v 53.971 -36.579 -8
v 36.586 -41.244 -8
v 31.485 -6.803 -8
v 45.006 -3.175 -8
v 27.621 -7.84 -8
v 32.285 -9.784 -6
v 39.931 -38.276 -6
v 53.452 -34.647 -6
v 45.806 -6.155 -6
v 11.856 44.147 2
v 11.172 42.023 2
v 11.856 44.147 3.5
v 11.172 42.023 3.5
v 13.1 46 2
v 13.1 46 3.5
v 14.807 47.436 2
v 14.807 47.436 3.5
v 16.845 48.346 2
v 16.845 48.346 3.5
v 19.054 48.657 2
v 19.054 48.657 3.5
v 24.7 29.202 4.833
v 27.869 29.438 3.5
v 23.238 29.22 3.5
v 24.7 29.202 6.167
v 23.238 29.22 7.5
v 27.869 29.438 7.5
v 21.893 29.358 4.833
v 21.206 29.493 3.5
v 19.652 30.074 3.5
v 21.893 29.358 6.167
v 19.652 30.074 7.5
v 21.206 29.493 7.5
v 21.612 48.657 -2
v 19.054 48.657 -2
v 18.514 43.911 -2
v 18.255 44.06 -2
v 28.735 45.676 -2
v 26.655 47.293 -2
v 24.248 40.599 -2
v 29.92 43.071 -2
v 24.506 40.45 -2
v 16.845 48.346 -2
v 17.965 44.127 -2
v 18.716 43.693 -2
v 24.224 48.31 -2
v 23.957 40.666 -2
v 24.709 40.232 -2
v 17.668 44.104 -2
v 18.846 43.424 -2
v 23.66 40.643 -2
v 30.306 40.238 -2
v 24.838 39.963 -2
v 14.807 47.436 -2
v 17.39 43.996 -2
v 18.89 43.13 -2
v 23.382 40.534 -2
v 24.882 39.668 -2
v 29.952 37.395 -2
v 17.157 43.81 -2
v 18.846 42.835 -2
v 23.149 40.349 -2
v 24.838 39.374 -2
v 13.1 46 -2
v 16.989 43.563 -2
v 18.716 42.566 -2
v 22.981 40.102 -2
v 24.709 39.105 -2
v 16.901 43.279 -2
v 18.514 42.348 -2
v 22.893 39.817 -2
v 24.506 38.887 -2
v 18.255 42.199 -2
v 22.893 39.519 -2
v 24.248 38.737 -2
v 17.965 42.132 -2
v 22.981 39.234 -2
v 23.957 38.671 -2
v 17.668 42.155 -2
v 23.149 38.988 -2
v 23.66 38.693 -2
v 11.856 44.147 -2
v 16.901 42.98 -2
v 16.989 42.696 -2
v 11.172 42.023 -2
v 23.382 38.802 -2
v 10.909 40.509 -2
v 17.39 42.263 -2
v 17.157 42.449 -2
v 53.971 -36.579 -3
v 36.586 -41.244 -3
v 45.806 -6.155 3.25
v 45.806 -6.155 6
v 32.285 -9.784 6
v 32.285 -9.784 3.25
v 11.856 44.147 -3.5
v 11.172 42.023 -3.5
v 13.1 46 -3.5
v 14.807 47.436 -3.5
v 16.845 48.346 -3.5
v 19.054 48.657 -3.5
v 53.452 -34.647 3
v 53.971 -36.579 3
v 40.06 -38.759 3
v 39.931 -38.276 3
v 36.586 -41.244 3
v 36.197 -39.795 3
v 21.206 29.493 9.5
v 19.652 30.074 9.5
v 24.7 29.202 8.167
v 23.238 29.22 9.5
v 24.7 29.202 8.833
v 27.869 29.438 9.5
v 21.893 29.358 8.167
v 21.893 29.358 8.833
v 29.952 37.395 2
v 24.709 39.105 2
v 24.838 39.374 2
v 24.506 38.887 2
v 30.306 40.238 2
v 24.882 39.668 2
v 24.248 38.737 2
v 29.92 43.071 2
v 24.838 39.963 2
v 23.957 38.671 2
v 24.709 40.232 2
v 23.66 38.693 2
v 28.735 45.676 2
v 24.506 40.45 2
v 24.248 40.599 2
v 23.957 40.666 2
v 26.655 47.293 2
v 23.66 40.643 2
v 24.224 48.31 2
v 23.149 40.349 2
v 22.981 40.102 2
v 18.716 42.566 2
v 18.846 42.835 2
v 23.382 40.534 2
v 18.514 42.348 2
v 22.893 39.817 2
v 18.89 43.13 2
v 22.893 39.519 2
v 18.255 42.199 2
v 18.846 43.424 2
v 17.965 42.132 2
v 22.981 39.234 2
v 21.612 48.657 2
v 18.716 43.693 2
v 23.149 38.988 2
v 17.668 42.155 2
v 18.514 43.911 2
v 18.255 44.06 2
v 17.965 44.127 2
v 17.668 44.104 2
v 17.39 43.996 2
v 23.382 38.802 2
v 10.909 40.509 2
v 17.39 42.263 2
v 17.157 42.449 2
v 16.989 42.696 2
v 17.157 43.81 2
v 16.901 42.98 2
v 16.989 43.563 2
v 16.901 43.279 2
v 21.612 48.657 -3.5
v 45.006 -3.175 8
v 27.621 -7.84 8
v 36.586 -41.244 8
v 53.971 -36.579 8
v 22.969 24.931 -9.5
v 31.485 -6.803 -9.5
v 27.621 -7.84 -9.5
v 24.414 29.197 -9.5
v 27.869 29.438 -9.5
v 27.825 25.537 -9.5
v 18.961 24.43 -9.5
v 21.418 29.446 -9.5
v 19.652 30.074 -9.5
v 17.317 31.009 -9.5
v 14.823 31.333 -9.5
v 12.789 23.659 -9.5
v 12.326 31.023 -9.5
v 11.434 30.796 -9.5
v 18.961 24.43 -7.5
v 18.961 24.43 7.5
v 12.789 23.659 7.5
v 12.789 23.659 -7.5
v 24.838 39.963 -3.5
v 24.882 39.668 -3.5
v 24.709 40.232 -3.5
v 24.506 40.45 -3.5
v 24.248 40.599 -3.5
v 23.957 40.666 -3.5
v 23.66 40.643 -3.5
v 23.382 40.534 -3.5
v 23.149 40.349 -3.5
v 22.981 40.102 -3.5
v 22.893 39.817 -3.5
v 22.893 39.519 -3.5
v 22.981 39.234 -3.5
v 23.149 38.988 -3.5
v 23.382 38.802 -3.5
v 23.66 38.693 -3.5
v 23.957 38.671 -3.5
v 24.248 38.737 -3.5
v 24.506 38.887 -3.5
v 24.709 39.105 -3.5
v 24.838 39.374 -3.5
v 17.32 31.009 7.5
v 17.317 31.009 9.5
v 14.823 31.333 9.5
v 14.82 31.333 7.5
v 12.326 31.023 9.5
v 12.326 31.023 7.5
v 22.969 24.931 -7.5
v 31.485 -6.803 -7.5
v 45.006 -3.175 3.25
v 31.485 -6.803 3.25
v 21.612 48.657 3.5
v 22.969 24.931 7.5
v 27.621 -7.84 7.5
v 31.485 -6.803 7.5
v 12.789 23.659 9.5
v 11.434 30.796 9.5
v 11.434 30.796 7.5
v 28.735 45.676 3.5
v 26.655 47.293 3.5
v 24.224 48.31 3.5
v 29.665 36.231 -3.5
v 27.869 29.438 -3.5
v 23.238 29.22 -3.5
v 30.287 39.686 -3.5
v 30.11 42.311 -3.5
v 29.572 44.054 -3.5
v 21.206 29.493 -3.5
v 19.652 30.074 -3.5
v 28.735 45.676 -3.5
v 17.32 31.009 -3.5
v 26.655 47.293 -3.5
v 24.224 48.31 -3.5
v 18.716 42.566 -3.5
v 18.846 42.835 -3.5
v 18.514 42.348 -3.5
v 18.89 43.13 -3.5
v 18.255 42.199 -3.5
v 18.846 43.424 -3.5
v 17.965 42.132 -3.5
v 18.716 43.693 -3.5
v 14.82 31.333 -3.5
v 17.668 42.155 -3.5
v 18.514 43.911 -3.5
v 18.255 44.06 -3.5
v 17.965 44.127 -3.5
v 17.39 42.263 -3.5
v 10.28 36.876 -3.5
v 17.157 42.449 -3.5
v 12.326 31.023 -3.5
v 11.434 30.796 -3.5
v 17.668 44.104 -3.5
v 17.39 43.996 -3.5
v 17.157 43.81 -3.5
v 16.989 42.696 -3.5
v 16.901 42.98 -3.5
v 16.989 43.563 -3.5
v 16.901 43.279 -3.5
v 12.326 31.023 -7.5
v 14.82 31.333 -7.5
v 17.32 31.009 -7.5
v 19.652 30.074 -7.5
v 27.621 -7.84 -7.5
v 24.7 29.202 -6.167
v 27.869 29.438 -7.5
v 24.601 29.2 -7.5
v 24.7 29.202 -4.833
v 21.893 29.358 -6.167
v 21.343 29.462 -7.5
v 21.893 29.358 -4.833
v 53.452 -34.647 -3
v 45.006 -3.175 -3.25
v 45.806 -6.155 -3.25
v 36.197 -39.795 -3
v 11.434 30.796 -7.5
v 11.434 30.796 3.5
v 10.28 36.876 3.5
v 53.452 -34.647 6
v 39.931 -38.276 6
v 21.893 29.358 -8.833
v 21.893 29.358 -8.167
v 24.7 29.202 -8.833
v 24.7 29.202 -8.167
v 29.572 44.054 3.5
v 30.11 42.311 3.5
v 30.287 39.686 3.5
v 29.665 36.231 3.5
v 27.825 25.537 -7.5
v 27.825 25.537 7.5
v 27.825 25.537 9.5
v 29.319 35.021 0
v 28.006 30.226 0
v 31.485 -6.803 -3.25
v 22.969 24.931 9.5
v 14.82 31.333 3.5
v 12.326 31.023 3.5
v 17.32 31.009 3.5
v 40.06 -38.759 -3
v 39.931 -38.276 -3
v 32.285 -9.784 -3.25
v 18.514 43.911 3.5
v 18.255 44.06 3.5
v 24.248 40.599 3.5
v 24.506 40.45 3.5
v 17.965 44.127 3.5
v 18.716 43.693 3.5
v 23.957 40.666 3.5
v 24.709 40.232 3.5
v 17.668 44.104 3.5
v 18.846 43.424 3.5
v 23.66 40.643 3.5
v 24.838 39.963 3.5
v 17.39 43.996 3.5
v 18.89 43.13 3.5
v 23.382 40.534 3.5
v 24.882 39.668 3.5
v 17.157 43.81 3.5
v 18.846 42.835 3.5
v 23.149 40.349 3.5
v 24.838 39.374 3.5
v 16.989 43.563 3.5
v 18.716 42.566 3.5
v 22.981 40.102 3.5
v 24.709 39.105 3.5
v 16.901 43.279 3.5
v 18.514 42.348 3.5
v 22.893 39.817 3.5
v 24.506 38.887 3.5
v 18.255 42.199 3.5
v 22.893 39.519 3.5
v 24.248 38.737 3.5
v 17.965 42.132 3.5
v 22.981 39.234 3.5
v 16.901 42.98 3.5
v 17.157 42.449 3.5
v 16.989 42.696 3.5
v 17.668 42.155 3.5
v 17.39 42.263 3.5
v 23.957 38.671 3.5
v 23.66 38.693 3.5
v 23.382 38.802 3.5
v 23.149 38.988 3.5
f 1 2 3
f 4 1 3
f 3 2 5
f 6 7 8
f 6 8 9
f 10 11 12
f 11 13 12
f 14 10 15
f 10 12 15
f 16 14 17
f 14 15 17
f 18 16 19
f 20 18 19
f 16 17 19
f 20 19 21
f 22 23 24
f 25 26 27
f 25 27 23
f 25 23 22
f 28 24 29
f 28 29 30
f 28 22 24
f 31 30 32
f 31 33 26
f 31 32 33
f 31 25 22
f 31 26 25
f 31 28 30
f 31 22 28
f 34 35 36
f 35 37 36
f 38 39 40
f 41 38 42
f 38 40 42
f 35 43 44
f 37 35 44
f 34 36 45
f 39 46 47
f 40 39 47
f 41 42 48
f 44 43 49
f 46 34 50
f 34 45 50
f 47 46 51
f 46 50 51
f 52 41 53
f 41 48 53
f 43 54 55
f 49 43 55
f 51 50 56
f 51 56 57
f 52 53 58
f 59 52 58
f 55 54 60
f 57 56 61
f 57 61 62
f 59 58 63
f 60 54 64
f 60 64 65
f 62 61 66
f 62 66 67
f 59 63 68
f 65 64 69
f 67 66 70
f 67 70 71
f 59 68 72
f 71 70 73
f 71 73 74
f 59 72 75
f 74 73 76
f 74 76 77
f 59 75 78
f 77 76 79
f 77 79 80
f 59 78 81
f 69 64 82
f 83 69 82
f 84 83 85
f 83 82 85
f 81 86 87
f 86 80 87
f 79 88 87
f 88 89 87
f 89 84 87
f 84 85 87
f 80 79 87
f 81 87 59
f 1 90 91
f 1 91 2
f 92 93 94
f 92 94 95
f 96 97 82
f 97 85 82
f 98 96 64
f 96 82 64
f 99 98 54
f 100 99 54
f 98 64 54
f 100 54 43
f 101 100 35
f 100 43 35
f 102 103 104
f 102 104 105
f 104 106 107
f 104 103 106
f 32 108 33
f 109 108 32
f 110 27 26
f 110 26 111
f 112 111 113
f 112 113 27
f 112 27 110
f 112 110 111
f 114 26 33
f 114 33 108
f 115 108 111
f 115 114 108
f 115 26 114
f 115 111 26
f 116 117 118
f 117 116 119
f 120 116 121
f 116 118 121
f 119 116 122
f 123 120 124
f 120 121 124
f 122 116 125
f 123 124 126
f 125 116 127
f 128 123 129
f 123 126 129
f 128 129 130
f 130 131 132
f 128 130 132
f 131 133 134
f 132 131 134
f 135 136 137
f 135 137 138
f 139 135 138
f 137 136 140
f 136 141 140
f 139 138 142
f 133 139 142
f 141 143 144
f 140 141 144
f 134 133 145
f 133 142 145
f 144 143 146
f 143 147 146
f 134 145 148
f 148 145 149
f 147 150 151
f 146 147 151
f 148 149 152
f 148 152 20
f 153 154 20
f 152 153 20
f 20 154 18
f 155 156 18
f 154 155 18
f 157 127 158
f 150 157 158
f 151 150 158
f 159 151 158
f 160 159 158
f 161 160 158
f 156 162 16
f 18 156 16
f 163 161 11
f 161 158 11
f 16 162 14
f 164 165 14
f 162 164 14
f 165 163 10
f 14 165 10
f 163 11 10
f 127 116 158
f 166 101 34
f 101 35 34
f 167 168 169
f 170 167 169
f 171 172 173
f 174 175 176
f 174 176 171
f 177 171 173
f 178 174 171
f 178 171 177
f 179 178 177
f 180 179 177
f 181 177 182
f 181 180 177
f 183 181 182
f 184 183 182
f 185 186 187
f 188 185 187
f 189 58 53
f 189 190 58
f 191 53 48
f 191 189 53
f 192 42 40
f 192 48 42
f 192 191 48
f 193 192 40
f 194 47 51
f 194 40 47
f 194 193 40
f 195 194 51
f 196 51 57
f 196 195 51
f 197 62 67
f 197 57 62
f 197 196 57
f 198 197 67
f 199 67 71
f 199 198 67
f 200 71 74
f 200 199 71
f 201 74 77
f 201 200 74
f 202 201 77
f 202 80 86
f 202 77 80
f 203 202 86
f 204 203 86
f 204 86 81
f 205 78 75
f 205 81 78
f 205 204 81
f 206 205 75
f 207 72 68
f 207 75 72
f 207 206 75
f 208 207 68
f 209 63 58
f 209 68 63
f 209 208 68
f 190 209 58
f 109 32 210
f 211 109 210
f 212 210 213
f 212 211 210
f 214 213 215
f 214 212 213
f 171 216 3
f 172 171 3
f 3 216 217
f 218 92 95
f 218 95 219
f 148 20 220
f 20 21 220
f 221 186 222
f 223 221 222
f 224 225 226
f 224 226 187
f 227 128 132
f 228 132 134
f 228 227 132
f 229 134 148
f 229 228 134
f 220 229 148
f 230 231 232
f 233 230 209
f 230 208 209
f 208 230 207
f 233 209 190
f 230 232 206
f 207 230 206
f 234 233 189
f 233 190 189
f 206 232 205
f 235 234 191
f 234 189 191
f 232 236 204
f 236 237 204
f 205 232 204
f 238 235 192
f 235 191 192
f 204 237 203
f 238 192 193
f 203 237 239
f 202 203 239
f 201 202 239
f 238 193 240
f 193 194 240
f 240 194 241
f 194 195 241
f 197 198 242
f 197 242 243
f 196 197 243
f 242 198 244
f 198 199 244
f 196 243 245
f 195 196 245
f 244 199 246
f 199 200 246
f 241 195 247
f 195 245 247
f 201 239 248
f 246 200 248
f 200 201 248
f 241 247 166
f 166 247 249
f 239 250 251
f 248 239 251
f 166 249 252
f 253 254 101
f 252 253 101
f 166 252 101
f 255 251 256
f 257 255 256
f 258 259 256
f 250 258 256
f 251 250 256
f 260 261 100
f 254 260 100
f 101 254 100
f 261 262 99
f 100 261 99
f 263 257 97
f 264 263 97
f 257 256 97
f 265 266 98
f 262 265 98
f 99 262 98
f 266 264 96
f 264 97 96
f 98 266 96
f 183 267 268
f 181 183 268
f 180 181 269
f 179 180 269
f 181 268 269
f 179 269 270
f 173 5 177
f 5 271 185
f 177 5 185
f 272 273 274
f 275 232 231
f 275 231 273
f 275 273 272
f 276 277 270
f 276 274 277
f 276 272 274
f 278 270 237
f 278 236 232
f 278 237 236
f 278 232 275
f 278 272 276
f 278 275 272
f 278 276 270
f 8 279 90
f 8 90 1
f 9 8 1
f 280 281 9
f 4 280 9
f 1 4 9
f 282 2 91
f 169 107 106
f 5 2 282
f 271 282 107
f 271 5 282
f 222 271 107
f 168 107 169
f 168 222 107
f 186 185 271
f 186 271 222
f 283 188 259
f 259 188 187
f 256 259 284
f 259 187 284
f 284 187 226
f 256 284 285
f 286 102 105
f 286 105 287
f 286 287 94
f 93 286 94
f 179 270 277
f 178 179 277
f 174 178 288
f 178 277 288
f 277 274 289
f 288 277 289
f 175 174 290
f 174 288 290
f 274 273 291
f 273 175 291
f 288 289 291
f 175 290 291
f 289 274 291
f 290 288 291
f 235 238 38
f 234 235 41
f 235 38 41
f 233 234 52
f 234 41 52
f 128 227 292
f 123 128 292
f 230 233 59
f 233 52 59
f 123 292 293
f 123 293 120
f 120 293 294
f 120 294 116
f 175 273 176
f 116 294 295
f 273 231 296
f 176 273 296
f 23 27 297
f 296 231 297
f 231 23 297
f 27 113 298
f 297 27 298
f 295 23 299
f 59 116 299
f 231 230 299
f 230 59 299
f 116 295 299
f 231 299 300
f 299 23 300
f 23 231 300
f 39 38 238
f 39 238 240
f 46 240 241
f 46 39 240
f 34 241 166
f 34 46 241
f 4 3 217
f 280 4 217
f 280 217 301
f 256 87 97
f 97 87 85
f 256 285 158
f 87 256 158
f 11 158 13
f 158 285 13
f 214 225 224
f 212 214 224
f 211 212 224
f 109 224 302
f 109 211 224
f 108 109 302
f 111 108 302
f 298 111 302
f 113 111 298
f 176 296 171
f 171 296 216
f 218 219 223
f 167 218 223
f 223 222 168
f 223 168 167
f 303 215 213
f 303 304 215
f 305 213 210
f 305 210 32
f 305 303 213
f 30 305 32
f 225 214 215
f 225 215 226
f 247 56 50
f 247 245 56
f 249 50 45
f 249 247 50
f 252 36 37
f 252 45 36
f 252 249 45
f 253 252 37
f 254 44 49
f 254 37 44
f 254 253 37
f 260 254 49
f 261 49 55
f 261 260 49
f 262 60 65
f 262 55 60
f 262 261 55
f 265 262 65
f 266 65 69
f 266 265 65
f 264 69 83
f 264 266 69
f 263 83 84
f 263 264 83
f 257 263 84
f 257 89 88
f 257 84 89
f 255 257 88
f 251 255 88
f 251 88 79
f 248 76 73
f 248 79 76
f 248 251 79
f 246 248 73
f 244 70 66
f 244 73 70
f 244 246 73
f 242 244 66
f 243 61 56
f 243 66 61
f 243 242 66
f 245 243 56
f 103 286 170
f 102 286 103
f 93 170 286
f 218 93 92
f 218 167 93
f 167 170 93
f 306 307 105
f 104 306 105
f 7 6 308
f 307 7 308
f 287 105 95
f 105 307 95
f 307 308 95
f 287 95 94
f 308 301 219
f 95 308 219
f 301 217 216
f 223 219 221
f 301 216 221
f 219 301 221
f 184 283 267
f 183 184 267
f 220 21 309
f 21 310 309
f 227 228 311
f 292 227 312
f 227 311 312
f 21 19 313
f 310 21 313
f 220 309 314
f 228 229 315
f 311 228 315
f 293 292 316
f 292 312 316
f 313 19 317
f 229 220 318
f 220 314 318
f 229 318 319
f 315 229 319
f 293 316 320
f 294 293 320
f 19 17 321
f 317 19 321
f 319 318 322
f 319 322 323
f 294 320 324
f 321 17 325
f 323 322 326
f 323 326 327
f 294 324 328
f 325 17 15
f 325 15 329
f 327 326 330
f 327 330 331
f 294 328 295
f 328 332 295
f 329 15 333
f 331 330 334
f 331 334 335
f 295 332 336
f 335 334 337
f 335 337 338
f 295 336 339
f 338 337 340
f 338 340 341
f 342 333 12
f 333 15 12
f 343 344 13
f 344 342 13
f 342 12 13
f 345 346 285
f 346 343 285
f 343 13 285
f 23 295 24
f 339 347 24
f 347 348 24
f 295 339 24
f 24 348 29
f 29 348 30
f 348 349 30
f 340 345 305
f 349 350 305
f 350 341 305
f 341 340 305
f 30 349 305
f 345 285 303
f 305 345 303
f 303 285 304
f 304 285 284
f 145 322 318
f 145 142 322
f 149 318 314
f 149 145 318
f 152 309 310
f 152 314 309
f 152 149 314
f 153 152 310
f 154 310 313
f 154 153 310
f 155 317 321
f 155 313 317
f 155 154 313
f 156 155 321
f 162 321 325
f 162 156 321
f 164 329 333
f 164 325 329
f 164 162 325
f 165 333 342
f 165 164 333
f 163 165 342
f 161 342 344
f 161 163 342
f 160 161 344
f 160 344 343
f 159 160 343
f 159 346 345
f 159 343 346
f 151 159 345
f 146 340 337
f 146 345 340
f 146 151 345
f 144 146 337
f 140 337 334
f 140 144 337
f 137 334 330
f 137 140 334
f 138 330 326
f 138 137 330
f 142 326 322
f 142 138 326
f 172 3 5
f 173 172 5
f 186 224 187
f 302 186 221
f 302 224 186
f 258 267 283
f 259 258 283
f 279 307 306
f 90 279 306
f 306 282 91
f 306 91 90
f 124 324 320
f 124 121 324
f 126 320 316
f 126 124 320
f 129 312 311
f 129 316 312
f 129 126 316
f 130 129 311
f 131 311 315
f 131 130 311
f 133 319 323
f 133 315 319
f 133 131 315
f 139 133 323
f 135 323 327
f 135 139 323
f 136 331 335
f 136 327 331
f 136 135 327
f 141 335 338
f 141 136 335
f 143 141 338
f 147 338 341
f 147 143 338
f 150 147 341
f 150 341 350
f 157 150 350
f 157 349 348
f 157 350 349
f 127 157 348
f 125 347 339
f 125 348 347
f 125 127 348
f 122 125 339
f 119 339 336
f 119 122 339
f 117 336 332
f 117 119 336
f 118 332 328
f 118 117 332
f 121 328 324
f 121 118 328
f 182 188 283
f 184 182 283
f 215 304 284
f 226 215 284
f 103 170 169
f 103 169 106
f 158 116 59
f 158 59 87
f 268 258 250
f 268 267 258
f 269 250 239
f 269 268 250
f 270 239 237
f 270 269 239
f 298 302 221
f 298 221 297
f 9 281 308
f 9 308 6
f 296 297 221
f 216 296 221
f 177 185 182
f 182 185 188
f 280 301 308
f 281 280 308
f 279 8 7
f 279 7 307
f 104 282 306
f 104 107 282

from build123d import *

# Parameters (mm, degrees)
SKETCH10_R                = 1
BOSS_EXTRUDE5_DEPTH       = 7.5
CUT_EXTRUDE1_DEPTH        = 4
FILLET1_R                 = 10
CUT_EXTRUDE6_START        = -11
CUT_EXTRUDE6_DEPTH        = 10
CUT_EXTRUDE7_DEPTH        = 2
BOSS_EXTRUDE11_DEPTH      = 9
BOSS_EXTRUDE13_DEPTH      = 64
BOSS_EXTRUDE13_DEPTH_BACK = 3
SKETCH30_W                = 2
SKETCH30_H                = 15
BOSS_EXTRUDE14_DEPTH      = 14
BOSS_EXTRUDE14_DEPTH_BACK = 4
SKETCH31_W                = 1.5
SKETCH31_H                = 29.5
SKETCH31_W_2              = 0.5
SKETCH31_H_2              = 3.0862264
CUT_EXTRUDE9_DEPTH        = 9
FILLET2_R                 = 8
FILLET3_R                 = 10
BOSS_EXTRUDE15_DEPTH      = 2
BOSS_EXTRUDE16_START      = 2
BOSS_EXTRUDE16_DEPTH      = 2
CUT_EXTRUDE10_DEPTH       = 28


with BuildPart() as part:
    # Sketch10 → Boss-Extrude5 (new, symmetric)
    with BuildSketch(Plane.XY):
        Polygon((27.048887868, 48.656944563), (33.959433176, 37.989988632), (36.993816658, 26.682834617), (12.788755024, 23.658848526), (10.279677841, 36.875809012), (12.321789019, 48.656944563), align=None)
        with Locations((17.890076876, 43.12952492)):
            Circle(SKETCH10_R, mode=Mode.SUBTRACT)
        with Locations((23.882298789, 39.668364252)):
            Circle(SKETCH10_R, mode=Mode.SUBTRACT)
    extrude(amount=BOSS_EXTRUDE5_DEPTH, both=True)

    # Sketch11 → Cut-Extrude1 (cut)
    with BuildSketch(Plane.XY.offset(7.5)):
        with BuildLine():
            Line((17.825431655, 32.423947427), (9.123881611, 30.207909529))
            Line((9.123881611, 30.207909529), (6.594316119, 53.15991455))
            Line((6.594316119, 53.15991455), (34.693470887, 60.271659822))
            Line((34.693470887, 60.271659822), (37.752907488, 30.846026516))
            add(Edge.make_bspline(
                [(37.752907488, 30.846026516), (30.679137573, 30.15507536), (19.269012528, 26.734198276), (17.825431655, 32.423947427)],
                knots=[0, 0, 0, 0, 1, 1, 1, 1], degree=3))
        make_face()
    extrude(amount=-CUT_EXTRUDE1_DEPTH, mode=Mode.SUBTRACT)

    # Fillet1
    fillet1_edges = [part.edges().sort_by_distance(p)[0] for p in [
        (27.048887868, 48.656944563, -2),
    ]]
    fillet(fillet1_edges, radius=FILLET1_R)

    # Sketch11<2> → Cut-Extrude6 (cut)
    with BuildSketch(Plane.XY.offset(7.5).offset(CUT_EXTRUDE6_START)):
        with BuildLine():
            Line((17.825431655, 32.423947427), (9.123881611, 30.207909529))
            Line((9.123881611, 30.207909529), (6.594316119, 53.15991455))
            Line((6.594316119, 53.15991455), (34.693470887, 60.271659822))
            Line((34.693470887, 60.271659822), (37.752907488, 30.846026516))
            add(Edge.make_bspline(
                [(37.752907488, 30.846026516), (30.679137573, 30.15507536), (19.269012528, 26.734198276), (17.825431655, 32.423947427)],
                knots=[0, 0, 0, 0, 1, 1, 1, 1], degree=3))
        make_face()
    extrude(amount=-CUT_EXTRUDE6_DEPTH, mode=Mode.SUBTRACT)

    # Sketch16 → Cut-Extrude7 (cut, symmetric)
    with BuildSketch(Plane.XY):
        Polygon((10.074284509, 54.36084815), (34.418624568, 54.36084815), (34.418624568, 36.664364271), (10.074284509, 40.645108775), align=None)
    extrude(amount=CUT_EXTRUDE7_DEPTH, both=True, mode=Mode.SUBTRACT)

    # Sketch26 → Boss-Extrude11 (add)
    with BuildSketch(Plane(origin=(41.188168375, 11.053240949, 0), x_dir=(0, 0, -1), z_dir=(0.9658266565657433, 0.2591888683316433, 0))):
        Polygon((2, 27.88983665), (2, 26.535626274), (-2, 26.535626274), (-2, 27.88983665), (-3.5, 27.88983665), (-3.5, 20.267140373), (-7.5, 20.267140373), (-7.5, 16.182607471), (7.5, 16.182607471), (7.5, 20.267140372), (3.5, 20.267140373), (3.5, 27.88983665), align=None)
    extrude(amount=BOSS_EXTRUDE11_DEPTH)

    # Sketch30 → Boss-Extrude13 (add, two sides: drawn at the far end of the back side and taken through both)
    with BuildSketch(Plane(origin=(-4.194351717, 15.629593668, 0), x_dir=(0.9658266565657433, 0.25918886833164334, 0), z_dir=(0.25918886833164334, -0.9658266565657433, 0)).offset(-BOSS_EXTRUDE13_DEPTH_BACK)):
        with Locations((27.645507965, 0)):
            Rectangle(SKETCH30_W, SKETCH30_H)
        with Locations((25.645507965, 0)):
            Rectangle(SKETCH30_W, SKETCH30_H)
    extrude(amount=BOSS_EXTRUDE13_DEPTH + BOSS_EXTRUDE13_DEPTH_BACK)

    # Sketch31 → Boss-Extrude14 (add, two sides: drawn at the far end of the back side and taken through both)
    with BuildSketch(Plane(origin=(27.666595183, 7.424596792, 0), x_dir=(0, 0, -1), z_dir=(0.9658266565657432, 0.2591888683316434, 0)).offset(-BOSS_EXTRUDE14_DEPTH_BACK)):
        with Locations((-6.75, -32.567392529)):
            Rectangle(SKETCH31_W, SKETCH31_H)
        with Locations((-7.75, -32.567392529)):
            Rectangle(SKETCH31_W_2, SKETCH31_H)
        with Locations((6.75, -32.567392529)):
            Rectangle(SKETCH31_W, SKETCH31_H)
        with Locations((7.75, -32.567392529)):
            Rectangle(SKETCH31_W_2, SKETCH31_H)
        Polygon((-3, -47.317392529), (-6, -47.317392529), (-7.5, -47.317392529), (-7.5, -47.817392529), (-3, -47.817392529), align=None)
        Polygon((7.5, -47.817392529), (3, -47.817392529), (3, -49.317392529), (8, -49.317392529), (8, -47.317392529), (7.5, -47.317392529), align=None)
        Polygon((3, -47.317392529), (3, -47.817392529), (7.5, -47.817392529), (7.5, -47.317392529), (6, -47.317392529), align=None)
        Polygon((-7.5, -47.817392529), (-7.5, -47.317392529), (-8, -47.317392529), (-8, -49.317392529), (-3, -49.317392529), (-3, -47.817392529), align=None)
        Polygon((-7.5, -17.817392529), (-6, -17.817392529), (-3.25, -17.817392529), (-3.25, -14.731166129), (-7.5, -14.731166129), align=None)
        Polygon((3.25, -17.817392529), (6, -17.817392529), (7.5, -17.817392529), (7.5, -14.731166129), (3.25, -14.731166129), align=None)
        with Locations((7.75, -16.274279329)):
            Rectangle(SKETCH31_W_2, SKETCH31_H_2)
        with Locations((-7.75, -16.274279329)):
            Rectangle(SKETCH31_W_2, SKETCH31_H_2)
    extrude(amount=BOSS_EXTRUDE14_DEPTH + BOSS_EXTRUDE14_DEPTH_BACK)

    # Sketch32 → Cut-Extrude9 (cut)
    with BuildSketch(Plane(origin=(49.880608284, 13.385940764, 0), x_dir=(0, 0, -1), z_dir=(0.9658266565657431, 0.25918886833164445, 0))):
        Polygon((3.5, 27.88983665), (2, 27.88983665), (2, 26.535626274), (-2, 26.535626274), (-2, 27.88983665), (-3.5, 27.88983665), (-3.5, 20.267140373), (-7.5, 20.267140373), (-7.5, 16.182607471), (7.5, 16.182607471), (7.5, 20.267140372), (3.5, 20.267140373), align=None)
    extrude(amount=-CUT_EXTRUDE9_DEPTH, mode=Mode.SUBTRACT)

    # Fillet2
    fillet2_edges = [part.edges().sort_by_distance(p)[0] for p in [
        (12.321789019, 48.656944563, 2.75),
        (12.321789019, 48.656944563, -2.75),
    ]]
    fillet(fillet2_edges, radius=FILLET2_R)

    # Fillet3
    fillet3_edges = [part.edges().sort_by_distance(p)[0] for p in [
        (17.825431655, 32.423947427, 5.5),
        (17.825431655, 32.423947427, -5.5),
    ]]
    fillet(fillet3_edges, radius=FILLET3_R)

    # Sketch33 → Boss-Extrude15 (add)
    with BuildSketch(Plane(origin=(0, 0, -7.5), x_dir=(-1, 0, 0), z_dir=(0, 0, -1))):
        with BuildLine():
            Line((-11.433819556, 30.796185182), (-12.326379112, 31.023494775))
            ThreePointArc((-12.326379112, 31.023494775), (-16.080268918, 31.249787506), (-19.652288318, 30.073533078))
            add(Edge.make_bspline(
                [(-19.652288318, 30.073533078), (-23.094178016, 28.160579122), (-30.349802092, 29.858629099), (-35.935151197, 30.627785373)],
                knots=[0.191604014, 0.191604014, 0.191604014, 0.191604014, 0.918085752, 0.918085752, 0.918085752, 0.918085752], degree=3))
            Line((-35.935151197, 30.627785373), (-36.993816658, 26.682834617))
            Line((-36.993816658, 26.682834617), (-22.968678464, 24.93064644))
            Line((-22.968678464, 24.93064644), (-31.484749461, -6.803156137))
            Line((-31.484749461, -6.803156137), (-27.621442835, -7.839911611))
            Line((-27.621442835, -7.839911611), (-18.961496124, 24.430021246))
            Line((-18.961496124, 24.430021246), (-12.788755024, 23.658848526))
            Line((-12.788755024, 23.658848526), (-11.433819556, 30.796185182))
        make_face()
    extrude(amount=BOSS_EXTRUDE15_DEPTH)

    # Sketch34 → Boss-Extrude16 (add)
    with BuildSketch(Plane.XY.offset(7.5).offset(BOSS_EXTRUDE16_START)):
        with BuildLine():
            Line((12.326379112, 31.023494775), (11.433819556, 30.796185182))
            Line((11.433819556, 30.796185182), (12.788755024, 23.658848526))
            Line((12.788755024, 23.658848526), (22.968678464, 24.93064644))
            Line((22.968678464, 24.93064644), (36.993816658, 26.682834617))
            Line((36.993816658, 26.682834617), (35.935151197, 30.627785373))
            add(Edge.make_bspline(
                [(35.935151197, 30.627785373), (30.349802091, 29.858629099), (23.094178016, 28.160579122), (19.652288318, 30.073533078)],
                knots=[0.191604014, 0.191604014, 0.191604014, 0.191604014, 0.918085752, 0.918085752, 0.918085752, 0.918085752], degree=3))
            ThreePointArc((19.652288318, 30.073533078), (16.080268918, 31.249787506), (12.326379112, 31.023494775))
        make_face()
    extrude(amount=-BOSS_EXTRUDE16_DEPTH)

    # Sketch36 → Cut-Extrude10 (cut)
    with BuildSketch(Plane.XY.offset(9.5)):
        with BuildLine():
            Line((28.735168536, 45.675741107), (43.151621949, 50.021353904))
            Line((43.151621949, 50.021353904), (48.709339966, 19.453904806))
            Line((48.709339966, 19.453904806), (40.633280972, 13.201472036))
            add(Edge.make_bspline(
                [(28.735168536, 45.675741107), (36.204474426, 33.608717883), (15.102513827, 27.616803145), (34.98872361, 13.201472036), (40.633280972, 13.201472036)],
                knots=[0, 0, 0, 0, 0, 1, 1, 1, 1, 1], degree=4))
        make_face()
    extrude(amount=-CUT_EXTRUDE10_DEPTH, mode=Mode.SUBTRACT)


solid = part.part
